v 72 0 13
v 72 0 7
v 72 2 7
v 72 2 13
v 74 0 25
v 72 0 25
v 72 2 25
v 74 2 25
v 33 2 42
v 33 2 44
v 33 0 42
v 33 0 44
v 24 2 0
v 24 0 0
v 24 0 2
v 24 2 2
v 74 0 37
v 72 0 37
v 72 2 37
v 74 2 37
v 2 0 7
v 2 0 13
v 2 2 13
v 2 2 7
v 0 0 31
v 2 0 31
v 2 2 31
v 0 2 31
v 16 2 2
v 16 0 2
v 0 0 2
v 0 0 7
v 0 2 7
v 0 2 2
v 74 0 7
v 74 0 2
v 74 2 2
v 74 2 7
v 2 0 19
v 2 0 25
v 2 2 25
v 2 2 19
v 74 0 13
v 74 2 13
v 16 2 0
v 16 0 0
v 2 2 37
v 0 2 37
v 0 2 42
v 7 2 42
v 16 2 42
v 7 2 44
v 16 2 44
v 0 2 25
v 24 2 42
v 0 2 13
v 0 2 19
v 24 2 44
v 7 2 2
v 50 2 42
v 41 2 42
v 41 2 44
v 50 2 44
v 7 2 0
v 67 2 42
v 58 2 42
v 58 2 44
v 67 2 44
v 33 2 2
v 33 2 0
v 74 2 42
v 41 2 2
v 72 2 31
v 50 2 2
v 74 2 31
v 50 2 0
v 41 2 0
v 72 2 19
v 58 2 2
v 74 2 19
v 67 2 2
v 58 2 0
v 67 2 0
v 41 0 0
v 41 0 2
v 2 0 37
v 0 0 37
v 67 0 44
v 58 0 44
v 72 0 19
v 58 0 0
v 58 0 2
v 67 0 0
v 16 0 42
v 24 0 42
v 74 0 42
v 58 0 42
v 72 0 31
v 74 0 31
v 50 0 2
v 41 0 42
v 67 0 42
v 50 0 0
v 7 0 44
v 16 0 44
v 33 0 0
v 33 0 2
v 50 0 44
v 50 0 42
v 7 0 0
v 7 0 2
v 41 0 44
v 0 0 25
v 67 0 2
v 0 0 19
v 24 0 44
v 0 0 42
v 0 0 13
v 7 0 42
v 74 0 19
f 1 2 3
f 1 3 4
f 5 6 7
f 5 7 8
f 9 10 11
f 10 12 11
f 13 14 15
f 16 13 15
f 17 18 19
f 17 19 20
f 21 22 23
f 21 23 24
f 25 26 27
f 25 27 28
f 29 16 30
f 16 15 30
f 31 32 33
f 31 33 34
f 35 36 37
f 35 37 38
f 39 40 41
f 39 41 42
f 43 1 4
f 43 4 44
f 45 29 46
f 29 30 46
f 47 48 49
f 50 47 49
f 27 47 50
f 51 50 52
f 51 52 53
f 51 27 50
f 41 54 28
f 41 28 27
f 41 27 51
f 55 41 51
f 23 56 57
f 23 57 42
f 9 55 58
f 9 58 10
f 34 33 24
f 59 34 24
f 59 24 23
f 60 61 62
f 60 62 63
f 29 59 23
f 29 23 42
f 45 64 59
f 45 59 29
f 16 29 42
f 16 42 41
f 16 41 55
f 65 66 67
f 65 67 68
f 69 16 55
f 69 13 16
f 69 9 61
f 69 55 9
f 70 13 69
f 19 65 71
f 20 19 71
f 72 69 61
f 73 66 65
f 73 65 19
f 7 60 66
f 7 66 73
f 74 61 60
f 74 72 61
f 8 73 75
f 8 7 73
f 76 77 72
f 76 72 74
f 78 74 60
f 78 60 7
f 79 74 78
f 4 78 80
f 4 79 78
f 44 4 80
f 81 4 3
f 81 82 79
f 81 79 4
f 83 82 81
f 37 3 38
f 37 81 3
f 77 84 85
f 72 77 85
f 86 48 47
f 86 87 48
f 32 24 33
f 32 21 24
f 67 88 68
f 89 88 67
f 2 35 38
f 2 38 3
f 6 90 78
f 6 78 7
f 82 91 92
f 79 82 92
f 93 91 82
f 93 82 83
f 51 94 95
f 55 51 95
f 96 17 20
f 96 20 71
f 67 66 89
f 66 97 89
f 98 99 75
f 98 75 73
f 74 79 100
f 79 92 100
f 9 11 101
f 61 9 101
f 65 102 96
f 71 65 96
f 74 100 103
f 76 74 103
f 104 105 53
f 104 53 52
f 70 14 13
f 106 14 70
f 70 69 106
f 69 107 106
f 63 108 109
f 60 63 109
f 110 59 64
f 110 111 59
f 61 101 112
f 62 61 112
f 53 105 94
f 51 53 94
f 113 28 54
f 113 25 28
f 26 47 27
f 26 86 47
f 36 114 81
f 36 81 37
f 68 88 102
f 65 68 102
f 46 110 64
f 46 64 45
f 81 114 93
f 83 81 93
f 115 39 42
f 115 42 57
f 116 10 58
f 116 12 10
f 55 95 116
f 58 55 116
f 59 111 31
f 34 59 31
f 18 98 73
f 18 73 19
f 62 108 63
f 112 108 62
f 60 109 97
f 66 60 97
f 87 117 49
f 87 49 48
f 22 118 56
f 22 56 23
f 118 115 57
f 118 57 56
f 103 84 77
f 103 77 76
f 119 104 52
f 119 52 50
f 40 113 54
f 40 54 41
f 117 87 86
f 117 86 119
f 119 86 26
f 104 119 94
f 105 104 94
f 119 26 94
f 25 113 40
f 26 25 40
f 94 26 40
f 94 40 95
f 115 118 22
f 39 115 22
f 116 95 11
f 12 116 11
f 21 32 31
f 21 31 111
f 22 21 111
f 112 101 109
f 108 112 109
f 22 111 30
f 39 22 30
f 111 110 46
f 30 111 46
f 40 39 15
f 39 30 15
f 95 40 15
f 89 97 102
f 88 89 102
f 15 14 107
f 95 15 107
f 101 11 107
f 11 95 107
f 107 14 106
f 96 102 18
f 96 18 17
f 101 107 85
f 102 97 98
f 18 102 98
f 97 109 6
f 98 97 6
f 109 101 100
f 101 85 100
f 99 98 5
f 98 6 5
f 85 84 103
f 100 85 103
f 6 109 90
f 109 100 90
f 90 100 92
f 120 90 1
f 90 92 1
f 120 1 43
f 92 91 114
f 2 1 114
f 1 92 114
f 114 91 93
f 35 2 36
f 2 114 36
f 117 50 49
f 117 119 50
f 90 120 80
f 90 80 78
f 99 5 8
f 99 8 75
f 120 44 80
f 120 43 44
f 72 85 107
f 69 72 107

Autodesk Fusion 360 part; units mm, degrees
sketch "スケッチ1" plane through (0, 0, 0) normal (0, 1, 0) x (1, 0, 0)
  line L0 (0, 0) -> (74, 0)
  line L1 (74, 0) -> (74, -44)
  line L2 (74, -44) -> (0, -44)
  line L3 (0, -44) -> (0, 0)
  dimension "d1" = 74
  dimension "d2" = 44
extrude "押し出し1" add sketch "スケッチ1" along normal blind 2
sketch "スケッチ2" plane through (0, 0, 0) normal (0, -1, 0) x (1, 0, 0)
  line L0 (74, 44) -> (0, 44)
  line L1 (0, 44) -> (0, 0)
  line L2 (0, 0) -> (74, 0)
  line L3 (74, 0) -> (74, 44)
  line L4 (72, 37) -> (74, 37)
  line L5 (74, 37) -> (74, 31)
  line L6 (74, 31) -> (72, 31)
  line L7 (72, 31) -> (72, 37)
  line L8 (74, 25) -> (74, 19)
  line L9 (74, 19) -> (72, 19)
  line L10 (72, 19) -> (72, 25)
  line L11 (72, 25) -> (74, 25)
  line L12 (74, 13) -> (74, 7)
  line L13 (74, 7) -> (72, 7)
  line L14 (72, 7) -> (72, 13)
  line L15 (72, 13) -> (74, 13)
  line L16 (2, 25) -> (2, 19)
  line L17 (2, 31) -> (0, 31)
  line L18 (2, 37) -> (2, 31)
  line L19 (0, 25) -> (2, 25)
  line L20 (2, 13) -> (2, 7)
  line L21 (0, 19) -> (0, 25)
  line L22 (0, 13) -> (2, 13)
  line L23 (2, 7) -> (0, 7)
  line L24 (0, 31) -> (0, 37)
  line L25 (0, 37) -> (2, 37)
  line L26 (0, 7) -> (0, 13)
  line L27 (2, 19) -> (0, 19)
  line L28 (74, 44) -> (72, 44)
  line L29 (72, 44) -> (72, 42)
  line L30 (72, 42) -> (74, 42)
  line L31 (74, 42) -> (74, 44)
  line L32 (0, 44) -> (2, 44)
  line L33 (2, 44) -> (2, 42)
  line L34 (2, 42) -> (0, 42)
  line L35 (0, 42) -> (0, 44)
  line L36 (0, 0) -> (2, 0)
  line L37 (2, 0) -> (2, 2)
  line L38 (2, 2) -> (0, 2)
  line L39 (0, 2) -> (0, 0)
  line L40 (74, 0) -> (72, 0)
  line L41 (72, 0) -> (72, 2)
  line L42 (72, 2) -> (74, 2)
  line L43 (74, 2) -> (74, 0)
  dimension "d7" = 0
  dimension "d8" = -12
  dimension "d9" = 2
  dimension "d10" = 7
  dimension "d11" = 6
  dimension "d12" = 6
  dimension "d13" = 7
  dimension "d16" = -72
  dimension "d17" = 0
extrude "押し出し2" cut sketch "スケッチ2" against normal blind 2 contours L0 L3 L28 L29 L30 L31 | L0 L1 L32 L33 L34 L35 | L3 L4 L5 L6 L7 | L3 L8 L9 L10 L11 | L1 L17 L18 L24 L25 | L3 L12 L13 L14 L15 | L1 L16 L19 L21 L27 | L2 L3 L40 L41 L42 L43 | L1 L20 L22 L23 L26 | L1 L2 L36 L37 L38 L39
sketch "スケッチ3" plane through (0, 0, 0) normal (0, -1, 0) x (1, 0, 0)
  line L0 (74, 31) -> (72, 31)
  line L1 (72, 31) -> (72, 37)
  line L2 (72, 37) -> (74, 37)
  line L3 (74, 37) -> (74, 42)
  line L4 (74, 42) -> (72, 42)
  line L5 (72, 42) -> (72, 44)
  line L6 (72, 44) -> (2, 44)
  line L7 (2, 44) -> (2, 42)
  line L8 (2, 42) -> (0, 42)
  line L9 (0, 42) -> (0, 37)
  line L10 (0, 37) -> (2, 37)
  line L11 (2, 37) -> (2, 31)
  line L12 (2, 31) -> (0, 31)
  line L13 (0, 31) -> (0, 25)
  line L14 (0, 25) -> (2, 25)
  line L15 (2, 25) -> (2, 19)
  line L16 (2, 19) -> (0, 19)
  line L17 (0, 19) -> (0, 13)
  line L18 (0, 13) -> (2, 13)
  line L19 (2, 13) -> (2, 7)
  line L20 (2, 7) -> (0, 7)
  line L21 (0, 7) -> (0, 2)
  line L22 (0, 2) -> (2, 2)
  line L23 (2, 2) -> (2, 0)
  line L24 (2, 0) -> (72, 0)
  line L25 (72, 0) -> (72, 2)
  line L26 (72, 2) -> (74, 2)
  line L27 (74, 2) -> (74, 7)
  line L28 (74, 7) -> (72, 7)
  line L29 (72, 7) -> (72, 13)
  line L30 (72, 13) -> (74, 13)
  line L31 (74, 13) -> (74, 19)
  line L32 (74, 19) -> (72, 19)
  line L33 (72, 19) -> (72, 25)
  line L34 (72, 25) -> (74, 25)
  line L35 (74, 25) -> (74, 31)
  line L36 (0, 44) -> (7, 44)
  line L37 (7, 44) -> (7, 42)
  line L38 (7, 42) -> (0, 42)
  line L39 (0, 42) -> (0, 44)
  line L40 (16, 42) -> (24, 42)
  line L41 (24, 42) -> (24, 44)
  line L42 (24, 44) -> (16, 44)
  line L43 (16, 44) -> (16, 42)
  line L44 (41, 42) -> (41, 44)
  line L45 (33, 42) -> (41, 42)
  line L46 (41, 44) -> (33, 44)
  line L47 (33, 44) -> (33, 42)
  line L48 (58, 42) -> (58, 44)
  line L49 (50, 42) -> (58, 42)
  line L50 (58, 44) -> (50, 44)
  line L51 (50, 44) -> (50, 42)
  line L52 (67, 42) -> (74, 42)
  line L53 (74, 42) -> (74, 44)
  line L54 (74, 44) -> (67, 44)
  line L55 (67, 44) -> (67, 42)
  line L56 (7, 0) -> (0, 0)
  line L57 (41, 2) -> (33, 2)
  line L58 (33, 2) -> (33, 0)
  line L59 (50, 2) -> (50, 0)
  line L60 (24, 2) -> (16, 2)
  line L61 (24, 0) -> (24, 2)
  line L62 (16, 0) -> (24, 0)
  line L63 (7, 2) -> (7, 0)
  line L64 (50, 0) -> (58, 0)
  line L65 (67, 2) -> (67, 0)
  line L66 (0, 0) -> (0, 2)
  line L67 (74, 2) -> (67, 2)
  line L68 (41, 0) -> (41, 2)
  line L69 (58, 2) -> (50, 2)
  line L70 (16, 2) -> (16, 0)
  line L71 (33, 0) -> (41, 0)
  line L72 (67, 0) -> (74, 0)
  line L73 (58, 0) -> (58, 2)
  line L74 (0, 2) -> (7, 2)
  line L75 (74, 0) -> (74, 2)
  line L76 (72, 0) -> (72, 2)
  line L77 (74, 0) -> (72, 0)
  line L78 (2, 2) -> (2, 0)
  line L79 (2, 0) -> (0, 0)
  dimension "d20" = 8
  dimension "d21" = 2
  dimension "d22" = 2
  dimension "d23" = 9
  dimension "d26" = 17
  dimension "d27" = 0
  dimension "d28" = 2
  dimension "d29" = 9
extrude "押し出し3" cut sketch "スケッチ3" against normal blind 2 contours L4 L5 L52 L53 L54 | L5 L6 L52 L54 L55 | L6 L48 L49 L50 L51 | L25 L26 L67 L72 L75 L76 L77 | L6 L44 L45 L46 L47 | L24 L25 L65 L67 L72 L76 | L6 L40 L41 L42 L43 | L24 L59 L64 L69 L73 | L6 L7 L36 L37 L38 | L7 L8 L36 L38 L39 | L24 L57 L58 L68 L71 | L24 L60 L61 L62 L70 | L23 L24 L56 L63 L74 L78 | L22 L23 L56 L66 L74 L78 L79
